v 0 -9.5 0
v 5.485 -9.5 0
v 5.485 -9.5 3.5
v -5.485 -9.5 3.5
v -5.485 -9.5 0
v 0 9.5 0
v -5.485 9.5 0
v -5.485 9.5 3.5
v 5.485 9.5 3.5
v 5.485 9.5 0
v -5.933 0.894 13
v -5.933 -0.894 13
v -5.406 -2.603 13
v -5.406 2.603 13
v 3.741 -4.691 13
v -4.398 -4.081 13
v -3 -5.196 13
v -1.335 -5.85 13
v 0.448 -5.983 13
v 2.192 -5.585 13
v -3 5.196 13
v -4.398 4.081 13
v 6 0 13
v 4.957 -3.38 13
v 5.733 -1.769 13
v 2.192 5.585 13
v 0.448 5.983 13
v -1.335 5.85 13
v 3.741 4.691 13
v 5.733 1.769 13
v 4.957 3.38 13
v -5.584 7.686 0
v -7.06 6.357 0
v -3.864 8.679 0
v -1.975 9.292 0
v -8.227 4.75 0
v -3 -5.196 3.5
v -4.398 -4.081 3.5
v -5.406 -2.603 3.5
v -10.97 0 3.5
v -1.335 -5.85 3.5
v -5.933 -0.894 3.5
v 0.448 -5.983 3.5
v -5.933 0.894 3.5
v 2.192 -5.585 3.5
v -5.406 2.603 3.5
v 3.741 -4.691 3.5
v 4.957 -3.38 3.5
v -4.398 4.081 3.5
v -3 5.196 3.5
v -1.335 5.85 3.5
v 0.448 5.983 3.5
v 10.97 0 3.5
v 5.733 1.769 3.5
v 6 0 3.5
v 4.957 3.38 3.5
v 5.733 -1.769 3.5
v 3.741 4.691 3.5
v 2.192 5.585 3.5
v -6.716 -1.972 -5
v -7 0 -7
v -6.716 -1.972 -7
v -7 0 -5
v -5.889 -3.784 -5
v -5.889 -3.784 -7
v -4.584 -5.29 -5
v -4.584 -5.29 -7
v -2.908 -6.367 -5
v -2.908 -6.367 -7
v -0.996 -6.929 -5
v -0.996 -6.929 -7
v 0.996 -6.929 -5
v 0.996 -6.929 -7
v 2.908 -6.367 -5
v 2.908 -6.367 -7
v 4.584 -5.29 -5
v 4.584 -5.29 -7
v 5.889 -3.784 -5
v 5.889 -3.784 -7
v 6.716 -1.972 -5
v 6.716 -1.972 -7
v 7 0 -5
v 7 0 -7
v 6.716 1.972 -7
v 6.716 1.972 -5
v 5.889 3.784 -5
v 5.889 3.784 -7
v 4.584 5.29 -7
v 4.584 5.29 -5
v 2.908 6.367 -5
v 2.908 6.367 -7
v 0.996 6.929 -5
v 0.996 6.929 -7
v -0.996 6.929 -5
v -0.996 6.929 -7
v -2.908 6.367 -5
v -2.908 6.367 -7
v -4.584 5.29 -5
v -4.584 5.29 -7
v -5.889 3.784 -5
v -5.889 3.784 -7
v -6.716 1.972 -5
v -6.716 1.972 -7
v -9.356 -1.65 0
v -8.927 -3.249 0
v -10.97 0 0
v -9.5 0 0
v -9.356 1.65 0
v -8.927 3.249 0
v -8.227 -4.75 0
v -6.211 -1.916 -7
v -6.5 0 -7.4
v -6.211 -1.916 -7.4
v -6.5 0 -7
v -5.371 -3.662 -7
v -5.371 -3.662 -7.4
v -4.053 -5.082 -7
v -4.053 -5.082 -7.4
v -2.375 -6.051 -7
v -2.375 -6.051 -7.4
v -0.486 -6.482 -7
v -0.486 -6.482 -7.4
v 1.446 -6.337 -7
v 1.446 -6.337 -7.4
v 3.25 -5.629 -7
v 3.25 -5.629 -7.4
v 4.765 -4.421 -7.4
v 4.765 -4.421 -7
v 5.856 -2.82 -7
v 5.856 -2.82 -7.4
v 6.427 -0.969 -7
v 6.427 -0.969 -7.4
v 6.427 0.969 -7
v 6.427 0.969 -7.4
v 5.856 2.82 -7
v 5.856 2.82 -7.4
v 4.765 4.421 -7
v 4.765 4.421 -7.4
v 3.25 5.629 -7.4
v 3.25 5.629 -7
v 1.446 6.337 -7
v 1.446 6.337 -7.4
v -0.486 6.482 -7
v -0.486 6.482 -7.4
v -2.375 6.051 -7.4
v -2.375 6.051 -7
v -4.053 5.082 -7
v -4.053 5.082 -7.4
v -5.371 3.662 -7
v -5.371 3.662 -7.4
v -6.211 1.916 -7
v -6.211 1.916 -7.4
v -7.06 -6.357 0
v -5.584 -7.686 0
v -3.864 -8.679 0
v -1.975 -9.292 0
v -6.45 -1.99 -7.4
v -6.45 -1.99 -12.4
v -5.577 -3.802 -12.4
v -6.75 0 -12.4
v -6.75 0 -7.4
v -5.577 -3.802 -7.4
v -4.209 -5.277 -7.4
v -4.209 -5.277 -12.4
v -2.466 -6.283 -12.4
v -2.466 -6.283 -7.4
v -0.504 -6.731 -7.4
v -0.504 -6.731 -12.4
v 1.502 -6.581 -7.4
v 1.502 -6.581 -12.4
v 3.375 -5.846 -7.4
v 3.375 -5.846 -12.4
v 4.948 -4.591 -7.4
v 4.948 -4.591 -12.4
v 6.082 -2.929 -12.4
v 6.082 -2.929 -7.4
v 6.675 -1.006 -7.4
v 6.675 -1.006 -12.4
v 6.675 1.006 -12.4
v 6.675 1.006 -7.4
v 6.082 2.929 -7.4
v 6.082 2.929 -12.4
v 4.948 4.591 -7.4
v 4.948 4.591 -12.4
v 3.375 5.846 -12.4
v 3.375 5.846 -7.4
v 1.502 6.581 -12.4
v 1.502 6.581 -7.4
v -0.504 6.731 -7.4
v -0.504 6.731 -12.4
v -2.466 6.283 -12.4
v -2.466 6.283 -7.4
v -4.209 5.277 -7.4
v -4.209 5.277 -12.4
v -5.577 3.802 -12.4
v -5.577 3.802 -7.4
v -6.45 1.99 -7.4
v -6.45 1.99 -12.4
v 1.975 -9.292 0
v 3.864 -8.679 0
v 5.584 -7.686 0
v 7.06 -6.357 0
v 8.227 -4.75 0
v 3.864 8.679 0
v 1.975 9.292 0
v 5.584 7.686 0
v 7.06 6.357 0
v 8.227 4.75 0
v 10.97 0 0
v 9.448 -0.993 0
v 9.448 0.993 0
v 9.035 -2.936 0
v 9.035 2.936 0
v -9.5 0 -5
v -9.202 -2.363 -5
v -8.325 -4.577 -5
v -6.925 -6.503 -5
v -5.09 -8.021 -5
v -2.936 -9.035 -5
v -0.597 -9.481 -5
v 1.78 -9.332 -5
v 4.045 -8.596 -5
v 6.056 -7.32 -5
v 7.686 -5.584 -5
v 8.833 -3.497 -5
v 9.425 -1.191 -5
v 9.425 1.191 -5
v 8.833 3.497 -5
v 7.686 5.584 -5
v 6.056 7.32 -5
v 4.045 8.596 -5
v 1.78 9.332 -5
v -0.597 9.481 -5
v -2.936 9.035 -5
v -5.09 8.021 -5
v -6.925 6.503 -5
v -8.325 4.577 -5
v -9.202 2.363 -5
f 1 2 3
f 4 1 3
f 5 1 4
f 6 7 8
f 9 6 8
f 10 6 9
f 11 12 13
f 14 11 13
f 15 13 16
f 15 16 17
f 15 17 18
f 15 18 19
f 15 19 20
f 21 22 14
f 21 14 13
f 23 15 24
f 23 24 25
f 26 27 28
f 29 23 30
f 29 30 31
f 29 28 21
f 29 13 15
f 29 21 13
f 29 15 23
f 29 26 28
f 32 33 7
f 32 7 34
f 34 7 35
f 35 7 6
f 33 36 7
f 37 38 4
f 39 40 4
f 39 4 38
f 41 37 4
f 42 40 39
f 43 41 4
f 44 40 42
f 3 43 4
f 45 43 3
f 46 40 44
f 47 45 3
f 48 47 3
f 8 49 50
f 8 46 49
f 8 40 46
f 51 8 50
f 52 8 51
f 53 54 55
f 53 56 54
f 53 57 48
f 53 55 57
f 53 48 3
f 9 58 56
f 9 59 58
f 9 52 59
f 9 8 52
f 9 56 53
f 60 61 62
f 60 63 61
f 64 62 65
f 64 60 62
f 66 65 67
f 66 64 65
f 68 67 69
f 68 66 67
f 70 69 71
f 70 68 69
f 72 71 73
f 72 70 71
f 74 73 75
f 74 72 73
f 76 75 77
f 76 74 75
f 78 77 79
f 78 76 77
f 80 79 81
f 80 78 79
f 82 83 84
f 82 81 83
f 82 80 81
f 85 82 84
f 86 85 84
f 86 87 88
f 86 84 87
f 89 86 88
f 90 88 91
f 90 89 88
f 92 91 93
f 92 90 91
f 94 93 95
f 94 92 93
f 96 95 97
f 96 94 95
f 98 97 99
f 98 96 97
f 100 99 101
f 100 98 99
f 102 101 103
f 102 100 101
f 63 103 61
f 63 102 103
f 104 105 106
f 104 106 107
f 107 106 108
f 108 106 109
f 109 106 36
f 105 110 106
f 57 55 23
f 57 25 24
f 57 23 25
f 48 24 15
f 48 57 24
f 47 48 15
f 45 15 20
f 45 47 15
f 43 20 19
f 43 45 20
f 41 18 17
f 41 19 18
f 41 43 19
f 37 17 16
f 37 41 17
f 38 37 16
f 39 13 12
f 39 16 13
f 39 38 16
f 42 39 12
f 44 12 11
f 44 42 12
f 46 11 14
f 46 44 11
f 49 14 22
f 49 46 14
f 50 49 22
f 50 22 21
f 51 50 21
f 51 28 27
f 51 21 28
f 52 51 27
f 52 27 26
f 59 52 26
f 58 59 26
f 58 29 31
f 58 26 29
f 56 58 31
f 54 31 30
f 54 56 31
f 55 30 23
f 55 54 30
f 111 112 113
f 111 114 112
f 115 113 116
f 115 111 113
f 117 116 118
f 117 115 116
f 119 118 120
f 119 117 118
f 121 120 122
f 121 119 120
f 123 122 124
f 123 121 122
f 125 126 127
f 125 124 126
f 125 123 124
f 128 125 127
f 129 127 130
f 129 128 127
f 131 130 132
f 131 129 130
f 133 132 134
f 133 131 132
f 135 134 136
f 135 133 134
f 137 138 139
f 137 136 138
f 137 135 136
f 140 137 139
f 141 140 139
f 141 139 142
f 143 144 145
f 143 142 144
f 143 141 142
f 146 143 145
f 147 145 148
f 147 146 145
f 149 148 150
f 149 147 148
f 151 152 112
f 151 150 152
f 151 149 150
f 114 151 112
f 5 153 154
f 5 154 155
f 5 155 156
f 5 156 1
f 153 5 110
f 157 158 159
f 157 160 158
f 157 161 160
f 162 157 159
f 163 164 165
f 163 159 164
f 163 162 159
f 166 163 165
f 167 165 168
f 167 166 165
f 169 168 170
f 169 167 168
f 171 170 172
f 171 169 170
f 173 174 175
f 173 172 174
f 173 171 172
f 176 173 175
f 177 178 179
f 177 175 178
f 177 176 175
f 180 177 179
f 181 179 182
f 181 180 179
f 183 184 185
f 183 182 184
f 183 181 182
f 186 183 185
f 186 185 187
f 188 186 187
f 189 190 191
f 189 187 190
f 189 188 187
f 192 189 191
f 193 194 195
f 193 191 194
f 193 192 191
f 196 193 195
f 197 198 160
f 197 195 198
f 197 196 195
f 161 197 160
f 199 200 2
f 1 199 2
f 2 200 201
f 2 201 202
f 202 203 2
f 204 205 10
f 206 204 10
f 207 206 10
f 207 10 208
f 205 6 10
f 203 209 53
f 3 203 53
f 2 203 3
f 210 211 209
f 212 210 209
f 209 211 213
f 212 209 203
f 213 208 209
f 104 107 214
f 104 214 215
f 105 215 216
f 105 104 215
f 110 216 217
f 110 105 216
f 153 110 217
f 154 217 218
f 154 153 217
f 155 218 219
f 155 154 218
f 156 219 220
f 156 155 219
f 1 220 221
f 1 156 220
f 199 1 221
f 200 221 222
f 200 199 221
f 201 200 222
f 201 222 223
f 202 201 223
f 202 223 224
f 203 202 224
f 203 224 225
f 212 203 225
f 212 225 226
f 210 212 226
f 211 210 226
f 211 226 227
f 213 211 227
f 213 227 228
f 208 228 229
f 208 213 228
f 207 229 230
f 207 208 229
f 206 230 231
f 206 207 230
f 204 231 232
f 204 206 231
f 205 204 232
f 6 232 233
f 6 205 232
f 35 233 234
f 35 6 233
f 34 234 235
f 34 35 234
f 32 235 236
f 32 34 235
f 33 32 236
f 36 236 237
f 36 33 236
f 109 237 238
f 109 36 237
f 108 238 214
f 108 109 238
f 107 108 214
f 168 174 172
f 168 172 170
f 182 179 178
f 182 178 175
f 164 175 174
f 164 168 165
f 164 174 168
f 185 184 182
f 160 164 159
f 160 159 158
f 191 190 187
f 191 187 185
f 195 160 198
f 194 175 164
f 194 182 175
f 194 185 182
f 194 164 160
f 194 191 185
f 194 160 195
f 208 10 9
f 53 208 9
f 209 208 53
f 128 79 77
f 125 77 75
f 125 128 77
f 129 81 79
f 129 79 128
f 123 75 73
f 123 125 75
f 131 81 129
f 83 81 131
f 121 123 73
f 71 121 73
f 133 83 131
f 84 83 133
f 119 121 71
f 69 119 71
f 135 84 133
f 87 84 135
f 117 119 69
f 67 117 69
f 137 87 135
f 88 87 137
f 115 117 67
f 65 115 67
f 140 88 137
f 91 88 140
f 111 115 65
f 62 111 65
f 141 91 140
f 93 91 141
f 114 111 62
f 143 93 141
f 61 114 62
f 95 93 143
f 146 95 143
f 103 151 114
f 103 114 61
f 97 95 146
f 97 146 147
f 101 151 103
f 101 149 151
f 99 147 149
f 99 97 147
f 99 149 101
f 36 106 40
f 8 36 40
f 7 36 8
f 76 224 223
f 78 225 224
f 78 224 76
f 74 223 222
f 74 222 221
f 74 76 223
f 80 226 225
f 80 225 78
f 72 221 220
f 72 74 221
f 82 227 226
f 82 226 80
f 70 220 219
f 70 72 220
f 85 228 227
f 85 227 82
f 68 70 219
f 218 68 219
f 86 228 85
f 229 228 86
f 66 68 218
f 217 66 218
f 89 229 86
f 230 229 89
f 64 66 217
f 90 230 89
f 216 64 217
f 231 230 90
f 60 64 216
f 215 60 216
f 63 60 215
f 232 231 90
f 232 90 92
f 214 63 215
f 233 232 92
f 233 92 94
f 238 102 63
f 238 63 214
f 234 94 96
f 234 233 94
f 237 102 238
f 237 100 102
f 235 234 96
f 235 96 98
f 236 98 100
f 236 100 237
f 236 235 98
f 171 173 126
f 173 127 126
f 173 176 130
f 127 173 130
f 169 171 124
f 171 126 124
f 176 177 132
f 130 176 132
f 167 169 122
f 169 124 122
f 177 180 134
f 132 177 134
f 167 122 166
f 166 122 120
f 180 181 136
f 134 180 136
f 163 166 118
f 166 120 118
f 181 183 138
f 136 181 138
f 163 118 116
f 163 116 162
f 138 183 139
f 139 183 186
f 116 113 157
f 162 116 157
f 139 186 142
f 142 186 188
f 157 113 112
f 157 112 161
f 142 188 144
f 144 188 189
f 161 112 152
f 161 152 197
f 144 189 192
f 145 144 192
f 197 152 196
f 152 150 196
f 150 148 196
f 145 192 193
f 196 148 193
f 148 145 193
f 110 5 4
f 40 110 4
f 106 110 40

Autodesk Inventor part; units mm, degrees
ref_plane "YZ Plane" through (0, 0, 0) normal (1, 0, 0) x (0, 1, 0)
ref_plane "XZ Plane" through (0, 0, 0) normal (0, 1, 0) x (-1, 0, 0)
ref_plane "XY Plane" through (0, 0, 0) normal (0, 0, 1) x (1, 0, 0)
sketch "Sketch2" plane through (0, 0, 0) normal (0, 0, 1) x (1, 0, 0)
  line L0 (10.9697, 0) -> (5.4848, -9.5)
  line L1 (5.4848, -9.5) -> (-5.4848, -9.5)
  line L2 (-5.4848, -9.5) -> (-10.9697, 0)
  line L3 (-10.9697, 0) -> (-5.4848, 9.5)
  line L4 (-5.4848, 9.5) -> (5.4848, 9.5)
  line L5 (5.4848, 9.5) -> (10.9697, 0)
  point P0 (0, 0)
  point P1 (0, 0)
  dimension "d2" = 9.5
  dimension "d3" = 19
extrude "Extrusion1" add sketch "Sketch2" along normal blind 3.5
sketch "Sketch3" plane through (0, 0, 3.5) normal (0, 0, 1) x (1, 0, 0)
  circle A0 centre (0, 0) radius 6
  dimension "d6" = 12
extrude "Extrusion2" add sketch "Sketch3" along normal blind 9.5
sketch "Sketch4" plane through (0, 0, 0) normal (0, 0, -1) x (-1, 0, 0)
  circle A0 centre (0, 0) radius 9.5
  dimension "d9" = 19
extrude "Extrusion3" add sketch "Sketch4" along normal blind 5
sketch "Sketch5" plane through (0, 0, -5) normal (0, 0, -1) x (-1, 0, 0)
  circle A0 centre (0, 0) radius 7
  dimension "d12" = 14
extrude "Extrusion4" add sketch "Sketch5" along normal blind 2
sketch "Sketch6" plane through (0, 0, -7) normal (0, 0, -1) x (-1, 0, 0)
  circle A0 centre (0, 0) radius 6.5
  dimension "d15" = 13
extrude "Extrusion5" add sketch "Sketch6" along normal blind 0.4
sketch "Sketch7" plane through (0, 0, -7.4) normal (0, 0, -1) x (-1, 0, 0)
  circle A0 centre (0, 0) radius 6.75
  dimension "d18" = 13.5
extrude "Extrusion6" add sketch "Sketch7" along normal blind 5
thread "Thread1" size "M12x1.75" class "6g" standard "ANSI Metric M Profile" full length
properties part number "NPI-19M-030G2"
